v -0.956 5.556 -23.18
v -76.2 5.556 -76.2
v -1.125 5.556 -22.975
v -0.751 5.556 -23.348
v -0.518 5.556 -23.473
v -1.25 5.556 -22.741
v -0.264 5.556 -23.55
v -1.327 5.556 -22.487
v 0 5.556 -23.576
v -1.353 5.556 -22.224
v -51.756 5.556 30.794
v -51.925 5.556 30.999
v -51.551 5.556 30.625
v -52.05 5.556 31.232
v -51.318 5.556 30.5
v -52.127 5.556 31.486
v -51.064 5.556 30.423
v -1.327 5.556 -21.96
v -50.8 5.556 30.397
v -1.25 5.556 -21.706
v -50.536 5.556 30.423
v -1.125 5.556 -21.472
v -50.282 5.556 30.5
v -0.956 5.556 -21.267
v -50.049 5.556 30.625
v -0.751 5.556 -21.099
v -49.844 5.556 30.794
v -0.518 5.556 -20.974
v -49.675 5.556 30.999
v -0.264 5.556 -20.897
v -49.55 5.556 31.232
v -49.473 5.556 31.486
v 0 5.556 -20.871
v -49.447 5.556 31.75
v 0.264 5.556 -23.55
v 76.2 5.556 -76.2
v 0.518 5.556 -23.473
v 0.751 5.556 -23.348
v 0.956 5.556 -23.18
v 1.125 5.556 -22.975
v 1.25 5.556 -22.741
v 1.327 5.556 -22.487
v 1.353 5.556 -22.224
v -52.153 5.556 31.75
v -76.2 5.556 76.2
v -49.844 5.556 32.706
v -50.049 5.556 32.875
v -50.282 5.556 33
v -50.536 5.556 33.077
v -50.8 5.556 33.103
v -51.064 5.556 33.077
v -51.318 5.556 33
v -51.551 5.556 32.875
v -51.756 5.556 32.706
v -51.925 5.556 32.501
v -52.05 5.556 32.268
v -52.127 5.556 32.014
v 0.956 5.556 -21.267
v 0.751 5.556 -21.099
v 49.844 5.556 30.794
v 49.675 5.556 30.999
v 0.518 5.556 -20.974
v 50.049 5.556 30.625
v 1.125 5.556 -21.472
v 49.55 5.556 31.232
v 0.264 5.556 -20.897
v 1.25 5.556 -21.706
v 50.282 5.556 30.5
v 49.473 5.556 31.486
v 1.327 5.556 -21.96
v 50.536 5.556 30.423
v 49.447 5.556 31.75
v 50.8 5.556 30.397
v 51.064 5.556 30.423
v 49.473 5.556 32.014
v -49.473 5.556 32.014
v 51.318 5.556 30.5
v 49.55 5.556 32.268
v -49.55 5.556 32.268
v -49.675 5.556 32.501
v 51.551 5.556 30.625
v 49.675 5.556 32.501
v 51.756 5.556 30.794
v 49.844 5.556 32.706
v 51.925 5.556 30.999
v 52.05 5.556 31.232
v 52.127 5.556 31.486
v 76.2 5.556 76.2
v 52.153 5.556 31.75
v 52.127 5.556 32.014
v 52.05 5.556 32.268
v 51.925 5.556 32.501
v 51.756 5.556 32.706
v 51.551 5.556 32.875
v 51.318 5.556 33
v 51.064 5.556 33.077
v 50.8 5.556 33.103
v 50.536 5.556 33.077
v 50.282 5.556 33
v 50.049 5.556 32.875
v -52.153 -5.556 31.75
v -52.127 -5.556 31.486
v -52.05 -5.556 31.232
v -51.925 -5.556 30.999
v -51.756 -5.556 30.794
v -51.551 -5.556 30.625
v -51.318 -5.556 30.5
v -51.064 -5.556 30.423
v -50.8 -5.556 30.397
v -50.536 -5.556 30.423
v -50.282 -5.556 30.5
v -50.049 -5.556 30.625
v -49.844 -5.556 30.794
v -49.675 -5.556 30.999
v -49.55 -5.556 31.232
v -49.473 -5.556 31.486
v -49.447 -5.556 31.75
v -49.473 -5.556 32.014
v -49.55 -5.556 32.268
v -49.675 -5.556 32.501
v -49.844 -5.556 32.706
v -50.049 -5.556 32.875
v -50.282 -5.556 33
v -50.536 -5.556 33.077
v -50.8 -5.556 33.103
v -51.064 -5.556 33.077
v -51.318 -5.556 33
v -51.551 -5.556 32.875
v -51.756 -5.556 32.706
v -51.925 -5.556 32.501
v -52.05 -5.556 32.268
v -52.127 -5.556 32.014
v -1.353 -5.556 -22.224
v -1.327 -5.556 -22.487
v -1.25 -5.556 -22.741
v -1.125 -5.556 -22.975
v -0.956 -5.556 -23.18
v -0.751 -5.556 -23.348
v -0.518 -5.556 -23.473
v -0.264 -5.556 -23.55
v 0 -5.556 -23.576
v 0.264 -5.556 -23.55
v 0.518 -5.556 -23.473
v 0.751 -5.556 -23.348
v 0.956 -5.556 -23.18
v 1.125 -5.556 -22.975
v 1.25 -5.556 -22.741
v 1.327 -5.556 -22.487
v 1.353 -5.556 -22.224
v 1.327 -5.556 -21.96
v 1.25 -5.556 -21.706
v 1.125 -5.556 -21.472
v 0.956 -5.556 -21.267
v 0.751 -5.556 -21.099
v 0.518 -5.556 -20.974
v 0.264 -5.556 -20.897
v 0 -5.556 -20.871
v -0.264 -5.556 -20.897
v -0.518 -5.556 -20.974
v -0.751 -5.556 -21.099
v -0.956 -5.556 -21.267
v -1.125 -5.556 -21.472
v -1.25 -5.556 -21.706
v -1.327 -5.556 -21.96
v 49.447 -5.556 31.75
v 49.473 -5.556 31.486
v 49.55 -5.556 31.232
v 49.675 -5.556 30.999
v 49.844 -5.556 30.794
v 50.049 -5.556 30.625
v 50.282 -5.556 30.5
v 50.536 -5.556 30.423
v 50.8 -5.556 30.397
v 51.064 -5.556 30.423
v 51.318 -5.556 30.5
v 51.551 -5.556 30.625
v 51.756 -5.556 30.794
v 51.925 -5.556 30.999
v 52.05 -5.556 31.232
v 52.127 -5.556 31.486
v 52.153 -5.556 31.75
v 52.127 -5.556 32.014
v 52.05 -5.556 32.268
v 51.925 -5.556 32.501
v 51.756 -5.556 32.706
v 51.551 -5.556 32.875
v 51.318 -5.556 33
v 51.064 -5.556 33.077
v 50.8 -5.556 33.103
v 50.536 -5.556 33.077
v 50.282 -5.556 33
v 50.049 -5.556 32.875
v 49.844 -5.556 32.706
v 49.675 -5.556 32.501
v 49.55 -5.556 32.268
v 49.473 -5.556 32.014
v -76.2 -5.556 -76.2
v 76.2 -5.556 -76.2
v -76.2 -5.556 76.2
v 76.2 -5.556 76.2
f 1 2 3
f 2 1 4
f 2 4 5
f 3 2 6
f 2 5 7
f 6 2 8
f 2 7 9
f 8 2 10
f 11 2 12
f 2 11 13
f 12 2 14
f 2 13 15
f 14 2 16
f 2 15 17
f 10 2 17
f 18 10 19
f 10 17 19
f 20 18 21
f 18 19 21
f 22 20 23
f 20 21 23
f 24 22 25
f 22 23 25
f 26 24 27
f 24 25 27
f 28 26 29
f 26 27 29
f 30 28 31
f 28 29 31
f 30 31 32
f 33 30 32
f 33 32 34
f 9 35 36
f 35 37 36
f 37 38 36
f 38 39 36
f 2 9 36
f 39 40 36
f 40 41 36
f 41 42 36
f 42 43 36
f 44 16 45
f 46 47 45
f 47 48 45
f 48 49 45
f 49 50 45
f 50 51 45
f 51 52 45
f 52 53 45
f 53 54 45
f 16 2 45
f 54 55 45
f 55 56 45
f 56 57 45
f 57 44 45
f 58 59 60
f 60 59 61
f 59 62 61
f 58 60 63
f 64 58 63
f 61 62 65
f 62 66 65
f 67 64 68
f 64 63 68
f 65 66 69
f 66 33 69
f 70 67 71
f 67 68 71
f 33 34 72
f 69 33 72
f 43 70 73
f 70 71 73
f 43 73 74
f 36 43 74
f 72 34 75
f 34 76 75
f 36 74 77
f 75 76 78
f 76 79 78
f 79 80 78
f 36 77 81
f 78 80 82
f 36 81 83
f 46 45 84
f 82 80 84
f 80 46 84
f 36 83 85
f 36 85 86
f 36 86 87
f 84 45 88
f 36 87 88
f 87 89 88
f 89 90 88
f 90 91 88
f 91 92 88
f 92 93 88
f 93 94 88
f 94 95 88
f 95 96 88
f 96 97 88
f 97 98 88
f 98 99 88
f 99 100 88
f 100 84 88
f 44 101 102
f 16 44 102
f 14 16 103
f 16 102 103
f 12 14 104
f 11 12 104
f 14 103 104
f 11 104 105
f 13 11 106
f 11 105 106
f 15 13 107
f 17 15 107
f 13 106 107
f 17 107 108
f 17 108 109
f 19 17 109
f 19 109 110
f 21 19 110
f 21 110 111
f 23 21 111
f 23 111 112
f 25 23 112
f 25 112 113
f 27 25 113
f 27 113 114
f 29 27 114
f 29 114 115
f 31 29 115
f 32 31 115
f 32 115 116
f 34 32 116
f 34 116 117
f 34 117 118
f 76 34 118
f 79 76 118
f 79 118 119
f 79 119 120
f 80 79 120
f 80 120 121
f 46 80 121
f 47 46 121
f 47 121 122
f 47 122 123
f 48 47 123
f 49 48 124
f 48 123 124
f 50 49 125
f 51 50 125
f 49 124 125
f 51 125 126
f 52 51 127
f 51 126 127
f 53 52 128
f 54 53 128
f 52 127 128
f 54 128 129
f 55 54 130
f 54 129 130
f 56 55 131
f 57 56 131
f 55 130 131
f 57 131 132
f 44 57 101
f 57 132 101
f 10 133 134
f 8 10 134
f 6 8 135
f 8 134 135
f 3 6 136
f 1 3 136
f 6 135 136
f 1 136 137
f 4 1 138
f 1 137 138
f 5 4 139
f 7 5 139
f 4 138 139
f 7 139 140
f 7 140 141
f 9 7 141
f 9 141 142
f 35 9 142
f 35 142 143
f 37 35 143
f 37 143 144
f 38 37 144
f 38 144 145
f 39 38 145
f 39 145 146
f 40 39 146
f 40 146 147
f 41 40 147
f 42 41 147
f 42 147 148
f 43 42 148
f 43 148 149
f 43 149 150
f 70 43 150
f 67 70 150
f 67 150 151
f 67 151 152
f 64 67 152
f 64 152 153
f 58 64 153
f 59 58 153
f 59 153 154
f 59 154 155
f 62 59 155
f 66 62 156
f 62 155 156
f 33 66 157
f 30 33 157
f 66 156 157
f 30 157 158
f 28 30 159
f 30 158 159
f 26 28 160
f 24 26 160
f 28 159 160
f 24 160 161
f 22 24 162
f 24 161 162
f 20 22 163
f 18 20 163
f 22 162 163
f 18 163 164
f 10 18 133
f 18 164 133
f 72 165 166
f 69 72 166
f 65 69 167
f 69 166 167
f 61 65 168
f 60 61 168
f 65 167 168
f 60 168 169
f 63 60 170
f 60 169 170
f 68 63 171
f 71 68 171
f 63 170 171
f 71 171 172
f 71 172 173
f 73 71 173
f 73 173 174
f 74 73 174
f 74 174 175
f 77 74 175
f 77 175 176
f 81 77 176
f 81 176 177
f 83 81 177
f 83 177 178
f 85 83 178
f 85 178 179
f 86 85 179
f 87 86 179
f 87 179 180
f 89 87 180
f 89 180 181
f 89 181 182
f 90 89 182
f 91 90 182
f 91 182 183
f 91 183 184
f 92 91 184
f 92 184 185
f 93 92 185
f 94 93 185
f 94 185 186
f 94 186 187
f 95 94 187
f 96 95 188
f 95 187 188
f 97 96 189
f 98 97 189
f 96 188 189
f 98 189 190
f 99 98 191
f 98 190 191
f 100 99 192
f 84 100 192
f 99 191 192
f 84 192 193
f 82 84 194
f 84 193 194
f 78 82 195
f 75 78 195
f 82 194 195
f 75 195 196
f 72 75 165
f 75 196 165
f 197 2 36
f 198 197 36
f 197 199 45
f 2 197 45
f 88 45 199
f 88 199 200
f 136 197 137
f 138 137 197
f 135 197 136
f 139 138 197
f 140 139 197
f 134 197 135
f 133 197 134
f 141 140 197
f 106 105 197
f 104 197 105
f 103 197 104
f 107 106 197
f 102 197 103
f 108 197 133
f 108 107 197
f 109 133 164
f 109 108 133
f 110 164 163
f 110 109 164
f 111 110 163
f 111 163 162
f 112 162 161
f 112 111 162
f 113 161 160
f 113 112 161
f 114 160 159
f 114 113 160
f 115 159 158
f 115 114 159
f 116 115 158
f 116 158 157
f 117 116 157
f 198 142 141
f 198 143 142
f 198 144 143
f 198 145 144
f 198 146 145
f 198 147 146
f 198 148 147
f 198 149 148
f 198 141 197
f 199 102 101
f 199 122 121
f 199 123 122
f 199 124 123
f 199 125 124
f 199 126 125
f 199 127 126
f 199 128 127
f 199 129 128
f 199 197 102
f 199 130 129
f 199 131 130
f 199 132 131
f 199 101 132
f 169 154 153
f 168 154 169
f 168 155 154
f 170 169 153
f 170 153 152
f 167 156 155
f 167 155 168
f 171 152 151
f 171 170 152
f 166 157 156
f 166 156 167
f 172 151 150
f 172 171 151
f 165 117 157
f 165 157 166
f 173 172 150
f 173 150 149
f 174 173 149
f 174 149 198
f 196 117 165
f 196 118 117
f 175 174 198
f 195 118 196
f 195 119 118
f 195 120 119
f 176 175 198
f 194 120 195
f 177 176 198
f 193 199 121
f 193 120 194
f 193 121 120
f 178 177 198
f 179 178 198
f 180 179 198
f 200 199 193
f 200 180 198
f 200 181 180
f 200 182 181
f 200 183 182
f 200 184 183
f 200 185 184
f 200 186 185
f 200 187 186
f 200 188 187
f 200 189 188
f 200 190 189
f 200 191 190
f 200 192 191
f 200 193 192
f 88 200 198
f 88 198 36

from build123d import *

# Parameters (mm, degrees)
SKETCH3_W             = 152.4
SKETCH3_H             = 11.1125
BOSS_EXTRUDE1_DEPTH   = 76.2
F_6_32_TAPPED_HOLE1_D = 2.7051


with BuildPart() as part:
    # Sketch3 → Boss-Extrude1 (new, symmetric)
    with BuildSketch(Plane.XY):
        Rectangle(SKETCH3_W, SKETCH3_H)
    extrude(amount=BOSS_EXTRUDE1_DEPTH, both=True)

    # #6-32 Tapped Hole1 (through all)
    with Locations(Plane(origin=(0, 5.55625, 0), x_dir=(1, 0, 0), z_dir=(0, 1, 0))):
        with Locations((0, 22.223542588), (50.8, -31.75), (-50.8, -31.75)):
            Hole(F_6_32_TAPPED_HOLE1_D / 2)


solid = part.part
